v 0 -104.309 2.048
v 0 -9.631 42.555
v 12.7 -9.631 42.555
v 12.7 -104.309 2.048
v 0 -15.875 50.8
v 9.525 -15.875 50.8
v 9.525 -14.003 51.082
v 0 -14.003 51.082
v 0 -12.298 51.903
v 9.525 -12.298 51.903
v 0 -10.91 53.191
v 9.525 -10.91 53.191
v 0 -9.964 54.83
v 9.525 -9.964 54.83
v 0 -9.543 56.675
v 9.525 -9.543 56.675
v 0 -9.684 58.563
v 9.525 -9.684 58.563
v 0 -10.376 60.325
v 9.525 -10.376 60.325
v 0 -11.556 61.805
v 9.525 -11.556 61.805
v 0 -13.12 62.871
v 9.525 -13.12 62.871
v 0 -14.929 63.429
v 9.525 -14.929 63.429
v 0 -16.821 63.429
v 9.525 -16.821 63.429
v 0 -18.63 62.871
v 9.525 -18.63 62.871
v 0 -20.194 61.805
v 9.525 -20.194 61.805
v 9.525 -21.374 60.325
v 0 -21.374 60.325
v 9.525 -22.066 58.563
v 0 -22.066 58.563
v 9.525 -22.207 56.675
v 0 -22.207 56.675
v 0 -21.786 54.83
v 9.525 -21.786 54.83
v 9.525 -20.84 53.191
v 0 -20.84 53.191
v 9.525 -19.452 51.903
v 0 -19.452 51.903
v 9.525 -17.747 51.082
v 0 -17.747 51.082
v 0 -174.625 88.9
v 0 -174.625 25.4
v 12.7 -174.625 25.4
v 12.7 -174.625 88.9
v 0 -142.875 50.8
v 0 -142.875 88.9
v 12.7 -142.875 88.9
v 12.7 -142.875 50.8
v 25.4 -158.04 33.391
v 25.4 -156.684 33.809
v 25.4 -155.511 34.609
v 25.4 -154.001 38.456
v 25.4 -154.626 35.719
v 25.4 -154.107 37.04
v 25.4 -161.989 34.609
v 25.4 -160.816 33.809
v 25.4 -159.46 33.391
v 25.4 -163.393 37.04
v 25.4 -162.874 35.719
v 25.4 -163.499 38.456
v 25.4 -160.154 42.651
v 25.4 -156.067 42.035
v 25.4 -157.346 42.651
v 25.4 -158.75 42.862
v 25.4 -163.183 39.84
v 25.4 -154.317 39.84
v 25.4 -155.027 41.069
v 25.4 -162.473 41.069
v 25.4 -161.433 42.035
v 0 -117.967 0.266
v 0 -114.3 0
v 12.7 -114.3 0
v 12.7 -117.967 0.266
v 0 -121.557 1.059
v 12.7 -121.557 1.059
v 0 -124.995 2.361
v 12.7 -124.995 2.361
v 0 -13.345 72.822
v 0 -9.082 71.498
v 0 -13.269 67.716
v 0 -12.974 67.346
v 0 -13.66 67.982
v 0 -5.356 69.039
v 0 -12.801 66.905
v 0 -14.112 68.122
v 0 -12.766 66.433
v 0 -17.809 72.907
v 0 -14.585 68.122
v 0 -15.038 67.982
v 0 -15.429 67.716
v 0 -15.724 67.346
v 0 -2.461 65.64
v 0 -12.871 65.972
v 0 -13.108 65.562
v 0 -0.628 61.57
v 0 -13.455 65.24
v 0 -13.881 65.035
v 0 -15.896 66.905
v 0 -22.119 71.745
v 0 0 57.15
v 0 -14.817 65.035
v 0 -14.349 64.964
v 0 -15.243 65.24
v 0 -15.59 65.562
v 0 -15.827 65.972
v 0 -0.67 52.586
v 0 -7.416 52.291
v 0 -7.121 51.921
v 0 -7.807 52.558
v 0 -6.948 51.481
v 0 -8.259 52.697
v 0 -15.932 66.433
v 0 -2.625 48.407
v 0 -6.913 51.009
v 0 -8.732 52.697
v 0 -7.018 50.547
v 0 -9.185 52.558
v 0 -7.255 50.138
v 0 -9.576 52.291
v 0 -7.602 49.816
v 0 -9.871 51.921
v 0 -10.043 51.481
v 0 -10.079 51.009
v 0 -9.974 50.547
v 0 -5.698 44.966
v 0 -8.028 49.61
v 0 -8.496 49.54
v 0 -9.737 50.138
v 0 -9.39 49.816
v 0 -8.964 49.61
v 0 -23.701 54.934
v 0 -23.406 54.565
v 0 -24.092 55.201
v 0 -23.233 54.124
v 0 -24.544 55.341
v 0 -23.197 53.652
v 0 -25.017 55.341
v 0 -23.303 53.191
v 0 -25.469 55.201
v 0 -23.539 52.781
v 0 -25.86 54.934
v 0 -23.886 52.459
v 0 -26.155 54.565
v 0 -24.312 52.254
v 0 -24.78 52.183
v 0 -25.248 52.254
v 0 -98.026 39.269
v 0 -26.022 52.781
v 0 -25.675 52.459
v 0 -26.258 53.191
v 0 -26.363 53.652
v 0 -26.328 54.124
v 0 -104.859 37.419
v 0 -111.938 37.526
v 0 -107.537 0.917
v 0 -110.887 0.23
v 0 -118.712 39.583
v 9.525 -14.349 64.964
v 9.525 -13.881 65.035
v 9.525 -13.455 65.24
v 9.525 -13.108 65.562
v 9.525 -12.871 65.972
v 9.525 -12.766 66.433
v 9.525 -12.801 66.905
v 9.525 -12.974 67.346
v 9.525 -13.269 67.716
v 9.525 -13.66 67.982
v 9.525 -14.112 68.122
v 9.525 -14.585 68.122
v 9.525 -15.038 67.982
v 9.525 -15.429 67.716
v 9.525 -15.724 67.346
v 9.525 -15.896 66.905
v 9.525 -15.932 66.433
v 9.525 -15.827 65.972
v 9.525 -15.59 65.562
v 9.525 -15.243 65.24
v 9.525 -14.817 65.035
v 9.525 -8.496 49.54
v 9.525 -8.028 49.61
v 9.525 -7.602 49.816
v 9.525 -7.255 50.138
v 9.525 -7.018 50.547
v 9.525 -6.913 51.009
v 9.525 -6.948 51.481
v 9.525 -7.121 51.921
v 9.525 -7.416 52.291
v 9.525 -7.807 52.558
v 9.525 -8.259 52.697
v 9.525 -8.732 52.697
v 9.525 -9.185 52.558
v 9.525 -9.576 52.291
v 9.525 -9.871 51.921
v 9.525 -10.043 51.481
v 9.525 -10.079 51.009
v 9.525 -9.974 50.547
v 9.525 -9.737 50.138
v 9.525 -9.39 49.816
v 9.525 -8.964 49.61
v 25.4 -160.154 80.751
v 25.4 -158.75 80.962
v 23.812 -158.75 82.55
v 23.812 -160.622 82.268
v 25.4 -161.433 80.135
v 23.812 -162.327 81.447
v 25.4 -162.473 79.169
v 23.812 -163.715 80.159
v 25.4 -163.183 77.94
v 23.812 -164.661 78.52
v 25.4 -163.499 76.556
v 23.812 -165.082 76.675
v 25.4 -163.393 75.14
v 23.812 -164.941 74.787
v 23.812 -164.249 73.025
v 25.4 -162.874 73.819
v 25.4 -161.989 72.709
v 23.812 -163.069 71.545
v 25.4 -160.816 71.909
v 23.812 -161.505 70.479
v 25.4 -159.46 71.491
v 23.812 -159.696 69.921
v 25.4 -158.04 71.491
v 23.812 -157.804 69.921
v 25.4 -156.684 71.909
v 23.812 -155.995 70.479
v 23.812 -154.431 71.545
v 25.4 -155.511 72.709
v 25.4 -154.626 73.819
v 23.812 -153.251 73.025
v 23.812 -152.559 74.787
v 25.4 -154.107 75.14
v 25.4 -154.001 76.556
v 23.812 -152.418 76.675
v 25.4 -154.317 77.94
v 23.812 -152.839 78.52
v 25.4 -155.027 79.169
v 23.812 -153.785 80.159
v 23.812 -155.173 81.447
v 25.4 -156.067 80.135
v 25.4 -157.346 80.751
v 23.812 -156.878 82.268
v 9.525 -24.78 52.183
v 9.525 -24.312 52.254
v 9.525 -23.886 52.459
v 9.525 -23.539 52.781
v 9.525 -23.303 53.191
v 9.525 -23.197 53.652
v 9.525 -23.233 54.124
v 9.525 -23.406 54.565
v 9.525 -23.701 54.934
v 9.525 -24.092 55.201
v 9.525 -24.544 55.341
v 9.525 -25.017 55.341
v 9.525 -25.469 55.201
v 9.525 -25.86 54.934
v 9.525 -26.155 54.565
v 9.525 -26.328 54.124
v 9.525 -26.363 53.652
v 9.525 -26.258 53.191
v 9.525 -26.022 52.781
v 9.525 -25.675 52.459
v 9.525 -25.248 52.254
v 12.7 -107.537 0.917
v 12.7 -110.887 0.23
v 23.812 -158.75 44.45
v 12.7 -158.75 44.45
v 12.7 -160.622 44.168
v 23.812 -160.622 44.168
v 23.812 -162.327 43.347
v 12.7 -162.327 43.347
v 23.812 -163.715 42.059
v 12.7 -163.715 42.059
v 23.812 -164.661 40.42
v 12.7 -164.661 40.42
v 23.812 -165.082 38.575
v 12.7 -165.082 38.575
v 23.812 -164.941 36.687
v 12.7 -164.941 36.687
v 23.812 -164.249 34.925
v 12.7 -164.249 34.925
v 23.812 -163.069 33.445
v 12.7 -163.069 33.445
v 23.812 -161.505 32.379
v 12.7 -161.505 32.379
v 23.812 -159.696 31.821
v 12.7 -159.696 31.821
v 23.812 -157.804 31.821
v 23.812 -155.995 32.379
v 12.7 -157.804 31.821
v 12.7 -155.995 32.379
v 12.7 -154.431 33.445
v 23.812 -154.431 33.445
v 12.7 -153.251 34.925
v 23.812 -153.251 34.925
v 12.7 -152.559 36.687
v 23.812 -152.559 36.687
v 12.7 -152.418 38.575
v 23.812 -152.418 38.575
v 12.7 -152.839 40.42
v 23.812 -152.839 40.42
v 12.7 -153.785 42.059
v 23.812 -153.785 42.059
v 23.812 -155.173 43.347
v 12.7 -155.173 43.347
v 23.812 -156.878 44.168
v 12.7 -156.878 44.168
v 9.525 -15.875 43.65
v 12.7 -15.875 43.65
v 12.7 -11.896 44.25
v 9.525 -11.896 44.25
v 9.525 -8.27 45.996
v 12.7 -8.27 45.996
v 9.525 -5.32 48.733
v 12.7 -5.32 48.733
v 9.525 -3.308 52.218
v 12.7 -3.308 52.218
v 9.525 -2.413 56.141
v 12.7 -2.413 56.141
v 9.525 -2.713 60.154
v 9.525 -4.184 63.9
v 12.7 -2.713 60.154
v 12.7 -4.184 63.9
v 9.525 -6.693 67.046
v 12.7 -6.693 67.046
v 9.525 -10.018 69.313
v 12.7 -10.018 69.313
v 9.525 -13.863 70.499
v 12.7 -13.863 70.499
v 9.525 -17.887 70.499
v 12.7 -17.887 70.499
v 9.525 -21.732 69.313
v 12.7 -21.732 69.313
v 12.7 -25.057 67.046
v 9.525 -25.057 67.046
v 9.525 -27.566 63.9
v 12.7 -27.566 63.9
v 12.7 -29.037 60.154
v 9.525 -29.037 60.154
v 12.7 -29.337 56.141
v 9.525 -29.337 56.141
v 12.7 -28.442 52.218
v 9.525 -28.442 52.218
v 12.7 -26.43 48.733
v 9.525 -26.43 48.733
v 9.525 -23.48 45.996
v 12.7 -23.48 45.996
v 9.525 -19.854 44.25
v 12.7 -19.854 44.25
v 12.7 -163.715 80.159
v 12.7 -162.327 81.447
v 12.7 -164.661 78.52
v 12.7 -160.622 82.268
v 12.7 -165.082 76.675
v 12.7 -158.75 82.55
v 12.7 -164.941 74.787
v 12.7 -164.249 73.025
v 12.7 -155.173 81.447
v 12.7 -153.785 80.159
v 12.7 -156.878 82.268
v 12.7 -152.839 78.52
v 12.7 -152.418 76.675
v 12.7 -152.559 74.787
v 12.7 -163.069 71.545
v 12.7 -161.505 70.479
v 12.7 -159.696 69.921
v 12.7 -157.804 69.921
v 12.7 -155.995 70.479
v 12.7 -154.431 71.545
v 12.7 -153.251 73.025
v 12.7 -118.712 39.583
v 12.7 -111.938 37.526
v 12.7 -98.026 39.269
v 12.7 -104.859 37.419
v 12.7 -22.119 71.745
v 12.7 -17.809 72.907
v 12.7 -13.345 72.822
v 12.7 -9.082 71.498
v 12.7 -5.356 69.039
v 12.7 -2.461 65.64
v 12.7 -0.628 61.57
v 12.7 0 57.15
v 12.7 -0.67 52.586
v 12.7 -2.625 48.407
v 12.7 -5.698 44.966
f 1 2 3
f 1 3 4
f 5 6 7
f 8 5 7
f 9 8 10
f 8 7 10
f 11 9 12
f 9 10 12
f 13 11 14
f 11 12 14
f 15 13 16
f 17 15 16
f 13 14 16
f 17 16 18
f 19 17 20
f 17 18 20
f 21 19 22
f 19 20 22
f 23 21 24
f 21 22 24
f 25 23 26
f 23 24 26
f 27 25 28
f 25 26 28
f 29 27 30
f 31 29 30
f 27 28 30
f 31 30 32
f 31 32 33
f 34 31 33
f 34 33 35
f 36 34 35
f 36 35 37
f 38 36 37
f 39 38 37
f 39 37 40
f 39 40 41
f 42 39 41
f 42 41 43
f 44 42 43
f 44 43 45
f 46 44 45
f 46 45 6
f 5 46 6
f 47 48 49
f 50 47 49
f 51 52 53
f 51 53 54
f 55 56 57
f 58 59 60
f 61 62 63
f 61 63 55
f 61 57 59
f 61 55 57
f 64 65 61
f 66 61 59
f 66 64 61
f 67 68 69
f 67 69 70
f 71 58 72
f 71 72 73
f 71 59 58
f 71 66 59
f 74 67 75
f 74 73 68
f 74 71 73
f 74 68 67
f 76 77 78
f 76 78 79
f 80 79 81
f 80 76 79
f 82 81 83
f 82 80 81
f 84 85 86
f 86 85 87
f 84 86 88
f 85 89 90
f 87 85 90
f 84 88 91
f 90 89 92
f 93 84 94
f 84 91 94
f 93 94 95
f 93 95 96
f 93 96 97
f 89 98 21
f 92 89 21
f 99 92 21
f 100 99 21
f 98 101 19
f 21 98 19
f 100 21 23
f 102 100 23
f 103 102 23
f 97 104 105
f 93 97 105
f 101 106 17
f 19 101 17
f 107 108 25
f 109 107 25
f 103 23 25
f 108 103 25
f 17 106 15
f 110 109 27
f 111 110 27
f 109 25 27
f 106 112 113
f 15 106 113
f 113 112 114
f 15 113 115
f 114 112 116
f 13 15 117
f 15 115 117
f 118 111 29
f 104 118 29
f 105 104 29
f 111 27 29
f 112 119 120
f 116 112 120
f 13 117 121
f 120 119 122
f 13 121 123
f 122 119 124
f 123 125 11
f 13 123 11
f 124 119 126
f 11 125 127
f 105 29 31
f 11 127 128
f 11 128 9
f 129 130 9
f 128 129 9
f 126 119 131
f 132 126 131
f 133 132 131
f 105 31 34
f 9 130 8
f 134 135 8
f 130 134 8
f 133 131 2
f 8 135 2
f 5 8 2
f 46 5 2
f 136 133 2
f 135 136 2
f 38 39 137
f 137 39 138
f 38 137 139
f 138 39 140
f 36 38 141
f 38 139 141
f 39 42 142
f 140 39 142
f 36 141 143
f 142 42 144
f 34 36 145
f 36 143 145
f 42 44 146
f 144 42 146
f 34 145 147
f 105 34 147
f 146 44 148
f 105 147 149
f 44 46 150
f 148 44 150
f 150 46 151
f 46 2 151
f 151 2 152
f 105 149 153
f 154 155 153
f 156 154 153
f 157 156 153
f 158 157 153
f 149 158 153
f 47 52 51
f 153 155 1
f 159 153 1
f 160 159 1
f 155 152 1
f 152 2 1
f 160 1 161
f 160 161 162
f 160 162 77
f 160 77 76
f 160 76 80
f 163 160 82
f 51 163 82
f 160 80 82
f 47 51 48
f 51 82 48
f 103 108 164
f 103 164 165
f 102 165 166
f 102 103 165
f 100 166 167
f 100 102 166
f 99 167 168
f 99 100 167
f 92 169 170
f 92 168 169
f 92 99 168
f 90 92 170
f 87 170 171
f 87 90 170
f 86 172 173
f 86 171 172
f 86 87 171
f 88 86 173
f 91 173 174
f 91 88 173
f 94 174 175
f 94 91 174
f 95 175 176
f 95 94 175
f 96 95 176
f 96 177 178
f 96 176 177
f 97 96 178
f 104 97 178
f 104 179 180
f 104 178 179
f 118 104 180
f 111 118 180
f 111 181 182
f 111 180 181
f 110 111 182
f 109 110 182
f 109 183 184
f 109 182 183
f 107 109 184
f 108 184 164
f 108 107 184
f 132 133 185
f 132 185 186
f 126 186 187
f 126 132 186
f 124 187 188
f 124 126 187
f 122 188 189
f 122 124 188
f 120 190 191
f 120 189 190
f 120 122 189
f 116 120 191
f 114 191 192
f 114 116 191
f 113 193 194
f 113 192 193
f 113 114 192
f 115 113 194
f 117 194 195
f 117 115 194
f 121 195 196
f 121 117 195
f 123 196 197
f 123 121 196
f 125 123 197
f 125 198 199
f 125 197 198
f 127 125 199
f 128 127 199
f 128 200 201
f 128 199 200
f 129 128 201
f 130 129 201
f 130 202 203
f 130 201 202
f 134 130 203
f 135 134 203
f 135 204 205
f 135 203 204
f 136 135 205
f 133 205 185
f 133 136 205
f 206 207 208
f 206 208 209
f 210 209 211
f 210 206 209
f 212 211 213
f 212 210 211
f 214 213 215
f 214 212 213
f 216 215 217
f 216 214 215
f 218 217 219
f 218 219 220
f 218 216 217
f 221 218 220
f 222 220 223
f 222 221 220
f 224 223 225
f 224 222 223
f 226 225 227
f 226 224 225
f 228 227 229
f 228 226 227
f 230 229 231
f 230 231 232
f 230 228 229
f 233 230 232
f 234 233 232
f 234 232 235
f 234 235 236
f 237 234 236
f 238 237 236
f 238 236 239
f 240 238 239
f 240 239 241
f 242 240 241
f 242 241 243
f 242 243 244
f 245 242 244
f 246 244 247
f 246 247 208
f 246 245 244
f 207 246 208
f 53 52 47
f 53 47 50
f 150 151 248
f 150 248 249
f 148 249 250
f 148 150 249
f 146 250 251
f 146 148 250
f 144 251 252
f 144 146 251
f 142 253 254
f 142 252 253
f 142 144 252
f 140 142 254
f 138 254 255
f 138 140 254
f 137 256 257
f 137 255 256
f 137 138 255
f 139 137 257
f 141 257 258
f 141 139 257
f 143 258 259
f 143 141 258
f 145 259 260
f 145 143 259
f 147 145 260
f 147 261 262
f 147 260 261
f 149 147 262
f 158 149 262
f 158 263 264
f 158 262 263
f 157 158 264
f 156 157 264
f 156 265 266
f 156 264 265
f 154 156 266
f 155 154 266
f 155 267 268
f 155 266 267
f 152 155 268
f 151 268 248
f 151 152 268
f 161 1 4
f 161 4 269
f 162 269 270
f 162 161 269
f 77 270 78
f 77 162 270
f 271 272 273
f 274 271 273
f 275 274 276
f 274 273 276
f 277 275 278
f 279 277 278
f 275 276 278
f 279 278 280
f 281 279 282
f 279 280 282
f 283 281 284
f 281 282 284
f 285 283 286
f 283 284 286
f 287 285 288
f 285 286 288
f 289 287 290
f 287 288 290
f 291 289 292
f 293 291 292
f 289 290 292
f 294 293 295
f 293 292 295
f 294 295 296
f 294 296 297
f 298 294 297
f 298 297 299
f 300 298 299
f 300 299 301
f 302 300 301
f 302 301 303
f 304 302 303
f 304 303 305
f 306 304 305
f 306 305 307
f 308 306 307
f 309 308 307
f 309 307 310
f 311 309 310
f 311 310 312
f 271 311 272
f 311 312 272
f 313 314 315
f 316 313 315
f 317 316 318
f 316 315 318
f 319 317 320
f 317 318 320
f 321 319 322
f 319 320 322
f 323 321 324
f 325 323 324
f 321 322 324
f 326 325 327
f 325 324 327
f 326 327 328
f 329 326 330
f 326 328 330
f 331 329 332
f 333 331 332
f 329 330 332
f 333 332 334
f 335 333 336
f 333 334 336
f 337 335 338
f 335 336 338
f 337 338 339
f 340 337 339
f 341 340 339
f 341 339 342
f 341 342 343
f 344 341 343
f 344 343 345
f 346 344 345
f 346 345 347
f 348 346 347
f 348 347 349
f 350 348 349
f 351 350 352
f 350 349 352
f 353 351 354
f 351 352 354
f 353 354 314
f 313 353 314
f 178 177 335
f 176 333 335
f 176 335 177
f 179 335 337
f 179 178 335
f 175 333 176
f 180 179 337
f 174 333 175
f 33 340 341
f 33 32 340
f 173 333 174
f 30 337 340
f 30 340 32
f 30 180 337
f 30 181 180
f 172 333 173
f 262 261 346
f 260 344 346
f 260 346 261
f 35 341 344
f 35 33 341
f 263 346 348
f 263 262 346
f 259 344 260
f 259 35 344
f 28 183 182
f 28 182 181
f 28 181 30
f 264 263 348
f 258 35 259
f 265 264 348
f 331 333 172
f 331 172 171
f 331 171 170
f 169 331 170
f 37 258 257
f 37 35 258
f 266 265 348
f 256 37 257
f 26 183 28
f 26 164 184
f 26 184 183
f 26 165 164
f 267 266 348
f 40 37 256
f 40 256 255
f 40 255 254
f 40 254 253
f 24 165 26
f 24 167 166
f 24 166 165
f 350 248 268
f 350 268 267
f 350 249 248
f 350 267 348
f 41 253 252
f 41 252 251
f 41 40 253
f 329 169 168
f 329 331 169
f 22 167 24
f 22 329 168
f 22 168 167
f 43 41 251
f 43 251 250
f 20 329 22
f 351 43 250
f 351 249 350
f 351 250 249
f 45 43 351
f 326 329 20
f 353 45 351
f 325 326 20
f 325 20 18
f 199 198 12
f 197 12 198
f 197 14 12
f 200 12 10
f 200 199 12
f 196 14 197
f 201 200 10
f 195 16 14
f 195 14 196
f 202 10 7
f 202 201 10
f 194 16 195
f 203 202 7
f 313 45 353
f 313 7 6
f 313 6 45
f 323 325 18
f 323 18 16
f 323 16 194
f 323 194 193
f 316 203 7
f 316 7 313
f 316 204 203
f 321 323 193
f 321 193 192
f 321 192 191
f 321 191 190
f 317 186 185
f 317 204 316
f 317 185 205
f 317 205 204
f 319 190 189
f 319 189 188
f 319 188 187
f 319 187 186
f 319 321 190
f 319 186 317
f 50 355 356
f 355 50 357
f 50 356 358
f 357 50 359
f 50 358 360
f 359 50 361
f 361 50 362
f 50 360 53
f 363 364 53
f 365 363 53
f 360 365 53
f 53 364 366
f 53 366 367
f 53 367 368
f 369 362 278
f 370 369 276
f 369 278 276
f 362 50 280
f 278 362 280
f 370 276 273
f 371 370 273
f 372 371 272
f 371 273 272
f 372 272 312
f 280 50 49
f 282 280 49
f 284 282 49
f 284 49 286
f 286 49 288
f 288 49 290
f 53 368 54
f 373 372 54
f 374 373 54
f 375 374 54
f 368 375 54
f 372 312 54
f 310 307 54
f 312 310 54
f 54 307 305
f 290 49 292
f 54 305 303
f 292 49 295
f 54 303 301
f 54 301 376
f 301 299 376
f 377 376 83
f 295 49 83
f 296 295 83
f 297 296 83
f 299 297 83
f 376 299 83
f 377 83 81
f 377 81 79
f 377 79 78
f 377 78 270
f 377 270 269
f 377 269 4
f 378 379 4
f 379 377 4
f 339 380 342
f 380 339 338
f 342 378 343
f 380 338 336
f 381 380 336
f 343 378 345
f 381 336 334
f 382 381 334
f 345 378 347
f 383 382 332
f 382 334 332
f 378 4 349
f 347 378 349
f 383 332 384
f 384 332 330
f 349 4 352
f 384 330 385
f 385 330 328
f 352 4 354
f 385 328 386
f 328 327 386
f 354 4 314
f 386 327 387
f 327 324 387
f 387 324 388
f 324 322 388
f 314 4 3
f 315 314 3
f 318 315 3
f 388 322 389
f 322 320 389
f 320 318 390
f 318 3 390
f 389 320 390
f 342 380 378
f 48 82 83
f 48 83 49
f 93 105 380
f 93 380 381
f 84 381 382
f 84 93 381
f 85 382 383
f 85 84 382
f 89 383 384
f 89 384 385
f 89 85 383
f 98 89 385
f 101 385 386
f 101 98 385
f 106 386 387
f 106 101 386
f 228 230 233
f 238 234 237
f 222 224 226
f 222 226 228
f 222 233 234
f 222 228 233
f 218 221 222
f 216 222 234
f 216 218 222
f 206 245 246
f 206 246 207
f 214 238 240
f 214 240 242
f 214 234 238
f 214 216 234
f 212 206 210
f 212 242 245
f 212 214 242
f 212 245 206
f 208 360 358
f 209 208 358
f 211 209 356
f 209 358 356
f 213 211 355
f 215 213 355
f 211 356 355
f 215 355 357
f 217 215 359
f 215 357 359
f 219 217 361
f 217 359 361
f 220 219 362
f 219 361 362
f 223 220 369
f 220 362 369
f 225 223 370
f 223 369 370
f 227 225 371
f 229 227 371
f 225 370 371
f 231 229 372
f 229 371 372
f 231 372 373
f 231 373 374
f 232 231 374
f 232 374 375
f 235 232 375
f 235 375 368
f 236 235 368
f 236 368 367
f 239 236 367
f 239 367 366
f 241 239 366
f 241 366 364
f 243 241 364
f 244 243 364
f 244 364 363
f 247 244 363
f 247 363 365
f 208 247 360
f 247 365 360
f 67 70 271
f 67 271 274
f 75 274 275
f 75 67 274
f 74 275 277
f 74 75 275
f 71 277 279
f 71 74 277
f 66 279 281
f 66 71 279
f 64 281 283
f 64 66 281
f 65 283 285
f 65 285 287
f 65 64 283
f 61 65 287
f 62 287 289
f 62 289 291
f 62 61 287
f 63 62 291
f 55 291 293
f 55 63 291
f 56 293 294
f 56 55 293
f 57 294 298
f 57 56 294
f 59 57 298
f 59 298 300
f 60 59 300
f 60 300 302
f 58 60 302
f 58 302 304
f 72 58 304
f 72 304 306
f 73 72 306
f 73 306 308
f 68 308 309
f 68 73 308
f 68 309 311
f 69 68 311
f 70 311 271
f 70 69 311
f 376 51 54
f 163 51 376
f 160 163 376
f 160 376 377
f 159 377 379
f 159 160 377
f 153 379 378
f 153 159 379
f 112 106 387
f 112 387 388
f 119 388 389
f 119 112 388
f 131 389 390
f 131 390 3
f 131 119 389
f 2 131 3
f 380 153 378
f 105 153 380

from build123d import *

# Parameters (mm, degrees)
BOSS_EXTRUDE1_DEPTH      = 88.9
CUT_EXTRUDE2_DEPTH       = 241.232341963
CUT_EXTRUDE2_DEPTH_BACK  = 241.232341963
SKETCH3_R                = 28.575
CUT_EXTRUDE5_DEPTH       = 28.575
CUT_EXTRUDE6_DEPTH       = 243.134084755
CUT_EXTRUDE6_DEPTH_BACK  = 243.134084755
SKETCH4_R                = 12.7
CUT_EXTRUDE7_DEPTH       = 261.369359036
CUT_EXTRUDE7_DEPTH_BACK  = 261.369359036
CUT_EXTRUDE8_DEPTH       = 261.369359036
CUT_EXTRUDE8_DEPTH_BACK  = 12.7
SKETCH6_R                = 9.525
SKETCH7_R                = 6.35
CUT_EXTRUDE9_DEPTH       = 12.7
SKETCH12_R               = 13.5
CUT_EXTRUDE13_DEPTH      = 3.175
CUT_EXTRUDE14_DEPTH      = 253.187753717
CUT_EXTRUDE14_DEPTH_BACK = 253.187753717
SKETCH14_R               = 1.5875
CUT_EXTRUDE15_DEPTH      = 261.369359036
CUT_EXTRUDE15_DEPTH_BACK = 261.369359036
SKETCH15_W               = 158.75
SKETCH15_H               = 174.625
SKETCH16_R               = 6.35
BOSS_EXTRUDE2_DEPTH      = 12.7
CHAMFER1_SIZE            = 1.5875


with BuildPart() as part:
    # Sketch1 → Boss-Extrude1 (new body)
    with BuildSketch(Plane.XY):
        Polygon((0, 0), (0, -174.625), (171.45, -174.625), (171.45, 0), (158.75, 0), (158.75, -142.875), (12.7, -142.875), (12.7, 0), align=None)
    extrude(amount=BOSS_EXTRUDE1_DEPTH)

    # Sketch2 → Cut-Extrude2 (cut, two sides: drawn at the far end of the back side and taken through both)
    with BuildSketch(Plane(origin=(0, -142.875, 0), x_dir=(1, 0, 0), z_dir=(0, 1, 0)).offset(-CUT_EXTRUDE2_DEPTH_BACK)):
        Polygon((158.75, 0), (12.7, 0), (12.7, -25.4), (85.724999876, -25.4), (158.75, -25.4), align=None)
    extrude(amount=CUT_EXTRUDE2_DEPTH + CUT_EXTRUDE2_DEPTH_BACK, mode=Mode.SUBTRACT)

    # Sketch3 → Cut-Extrude5 (cut)
    with BuildSketch(Plane.XZ.offset(174.625)):
        with Locations((85.725, 57.15)):
            Circle(SKETCH3_R)
    extrude(amount=-CUT_EXTRUDE5_DEPTH, mode=Mode.SUBTRACT)

    # Sketch4 → Cut-Extrude6 (cut, two sides: drawn at the far end of the back side and taken through both)
    with BuildSketch(Plane.XZ.offset(146.05).offset(-CUT_EXTRUDE6_DEPTH_BACK)):
        with Locations((85.725, 57.15)):
            Circle(SKETCH4_R)
    extrude(amount=CUT_EXTRUDE6_DEPTH + CUT_EXTRUDE6_DEPTH_BACK, mode=Mode.SUBTRACT)

    # Sketch5 → Cut-Extrude7 (cut, two sides: drawn at the far end of the back side and taken through both)
    with BuildSketch(Plane(origin=(171.45, 0, 0), x_dir=(0, 0, -1), z_dir=(1, 0, 0)).offset(-CUT_EXTRUDE7_DEPTH_BACK)):
        with BuildLine():
            Line((0, -174.625), (0, -114.3))
            ThreePointArc((0, -114.3), (-0.597344099, -119.776153781), (-2.361280333, -124.994736842))
            Line((-2.361280333, -124.994736842), (-25.4, -174.625))
            Line((-25.4, -174.625), (0, -174.625))
        make_face()
        with BuildLine():
            Line((-39.269490456, -98.025866748), (-71.745289975, -22.119448379))
            ThreePointArc((-71.745289975, -22.119448379), (-70.400400796, -7.131859618), (-57.149999966, 0))
            Line((-57.149999966, 0), (-88.9, 0))
            Line((-88.9, 0), (-88.9, -142.875))
            Line((-88.9, -142.875), (-50.8, -142.875))
            Line((-50.8, -142.875), (-39.583234749, -118.711720996))
            ThreePointArc((-39.583234749, -118.711720996), (-37.224875429, -108.402184034), (-39.269490456, -98.025866748))
        make_face()
        with BuildLine():
            Line((0, 0), (-57.149999966, 0))
            ThreePointArc((-57.149999966, 0), (-48.406859618, -2.624599204), (-42.554710025, -9.630551621))
            Line((-42.554710025, -9.630551621), (-2.047536041, -104.308882594))
            ThreePointArc((-2.047536041, -104.308882594), (-0.51714863, -109.200616928), (0, -114.3))
            Line((0, -114.3), (0, 0))
        make_face()
    extrude(amount=CUT_EXTRUDE7_DEPTH + CUT_EXTRUDE7_DEPTH_BACK, mode=Mode.SUBTRACT)

    # Sketch6 → Cut-Extrude8 (cut, two sides: drawn at the far end of the back side and taken through both)
    with BuildSketch(Plane(origin=(171.45, 0, 0), x_dir=(0, 0, -1), z_dir=(1, 0, 0)).offset(-CUT_EXTRUDE8_DEPTH_BACK)):
        with Locations(Location((-57.15, -15.875, 0), (0, 0, 90))):
            Circle(SKETCH6_R)
    extrude(amount=CUT_EXTRUDE8_DEPTH + CUT_EXTRUDE8_DEPTH_BACK, mode=Mode.SUBTRACT)

    # Sketch7 → Cut-Extrude9 (cut)
    with BuildSketch(Plane(origin=(12.7, 0, 0), x_dir=(0, 0, -1), z_dir=(1, 0, 0))):
        with Locations((-57.15, -15.875)):
            Circle(SKETCH7_R)
    extrude(amount=-CUT_EXTRUDE9_DEPTH, mode=Mode.SUBTRACT)

    # Sketch12 → Cut-Extrude13 (cut)
    with BuildSketch(Plane(origin=(12.7, 0, 0), x_dir=(0, 0, -1), z_dir=(1, 0, 0))):
        with Locations((-57.15, -15.875)):
            Circle(SKETCH12_R)
    extrude(amount=-CUT_EXTRUDE13_DEPTH, mode=Mode.SUBTRACT)

    # Sketch14 → Cut-Extrude14 (cut, two sides: drawn at the far end of the back side and taken through both)
    with BuildSketch(Plane(origin=(12.7, 0, 0), x_dir=(0, 0, -1), z_dir=(1, 0, 0)).offset(-CUT_EXTRUDE14_DEPTH_BACK)):
        with Locations((-53.770765225, -24.780413934)):
            Circle(SKETCH14_R)
        with Locations((-66.551932086, -14.348796194)):
            Circle(SKETCH14_R)
        with Locations((-51.12730269, -8.495789872)):
            Circle(SKETCH14_R)
    extrude(amount=CUT_EXTRUDE14_DEPTH + CUT_EXTRUDE14_DEPTH_BACK, mode=Mode.SUBTRACT)

    # Sketch15 → Cut-Extrude15 (cut, two sides: drawn at the far end of the back side and taken through both)
    with BuildSketch(Plane.XY.offset(88.9).offset(-CUT_EXTRUDE15_DEPTH_BACK)):
        with Locations((92.075, -87.3125)):
            Rectangle(SKETCH15_W, SKETCH15_H)
    extrude(amount=CUT_EXTRUDE15_DEPTH + CUT_EXTRUDE15_DEPTH_BACK, mode=Mode.SUBTRACT)

    # Sketch16 → Boss-Extrude2 (add)
    with BuildSketch(Plane(origin=(12.7, 0, 0), x_dir=(0, 0, -1), z_dir=(1, 0, 0))):
        with Locations(Location((-76.2, -158.75, 0), (0, 0, 180))):
            Circle(SKETCH16_R)
        with Locations(Location((-38.1, -158.75, 0), (0, 0, 180))):
            Circle(SKETCH16_R)
    extrude(amount=BOSS_EXTRUDE2_DEPTH)

    # Chamfer1
    chamfer1_edges = [part.edges().sort_by_distance(p)[0] for p in [
        (25.4, -158.75, 69.85),
        (25.4, -158.75, 31.75),
    ]]
    chamfer(chamfer1_edges, length=CHAMFER1_SIZE)


solid = part.part
